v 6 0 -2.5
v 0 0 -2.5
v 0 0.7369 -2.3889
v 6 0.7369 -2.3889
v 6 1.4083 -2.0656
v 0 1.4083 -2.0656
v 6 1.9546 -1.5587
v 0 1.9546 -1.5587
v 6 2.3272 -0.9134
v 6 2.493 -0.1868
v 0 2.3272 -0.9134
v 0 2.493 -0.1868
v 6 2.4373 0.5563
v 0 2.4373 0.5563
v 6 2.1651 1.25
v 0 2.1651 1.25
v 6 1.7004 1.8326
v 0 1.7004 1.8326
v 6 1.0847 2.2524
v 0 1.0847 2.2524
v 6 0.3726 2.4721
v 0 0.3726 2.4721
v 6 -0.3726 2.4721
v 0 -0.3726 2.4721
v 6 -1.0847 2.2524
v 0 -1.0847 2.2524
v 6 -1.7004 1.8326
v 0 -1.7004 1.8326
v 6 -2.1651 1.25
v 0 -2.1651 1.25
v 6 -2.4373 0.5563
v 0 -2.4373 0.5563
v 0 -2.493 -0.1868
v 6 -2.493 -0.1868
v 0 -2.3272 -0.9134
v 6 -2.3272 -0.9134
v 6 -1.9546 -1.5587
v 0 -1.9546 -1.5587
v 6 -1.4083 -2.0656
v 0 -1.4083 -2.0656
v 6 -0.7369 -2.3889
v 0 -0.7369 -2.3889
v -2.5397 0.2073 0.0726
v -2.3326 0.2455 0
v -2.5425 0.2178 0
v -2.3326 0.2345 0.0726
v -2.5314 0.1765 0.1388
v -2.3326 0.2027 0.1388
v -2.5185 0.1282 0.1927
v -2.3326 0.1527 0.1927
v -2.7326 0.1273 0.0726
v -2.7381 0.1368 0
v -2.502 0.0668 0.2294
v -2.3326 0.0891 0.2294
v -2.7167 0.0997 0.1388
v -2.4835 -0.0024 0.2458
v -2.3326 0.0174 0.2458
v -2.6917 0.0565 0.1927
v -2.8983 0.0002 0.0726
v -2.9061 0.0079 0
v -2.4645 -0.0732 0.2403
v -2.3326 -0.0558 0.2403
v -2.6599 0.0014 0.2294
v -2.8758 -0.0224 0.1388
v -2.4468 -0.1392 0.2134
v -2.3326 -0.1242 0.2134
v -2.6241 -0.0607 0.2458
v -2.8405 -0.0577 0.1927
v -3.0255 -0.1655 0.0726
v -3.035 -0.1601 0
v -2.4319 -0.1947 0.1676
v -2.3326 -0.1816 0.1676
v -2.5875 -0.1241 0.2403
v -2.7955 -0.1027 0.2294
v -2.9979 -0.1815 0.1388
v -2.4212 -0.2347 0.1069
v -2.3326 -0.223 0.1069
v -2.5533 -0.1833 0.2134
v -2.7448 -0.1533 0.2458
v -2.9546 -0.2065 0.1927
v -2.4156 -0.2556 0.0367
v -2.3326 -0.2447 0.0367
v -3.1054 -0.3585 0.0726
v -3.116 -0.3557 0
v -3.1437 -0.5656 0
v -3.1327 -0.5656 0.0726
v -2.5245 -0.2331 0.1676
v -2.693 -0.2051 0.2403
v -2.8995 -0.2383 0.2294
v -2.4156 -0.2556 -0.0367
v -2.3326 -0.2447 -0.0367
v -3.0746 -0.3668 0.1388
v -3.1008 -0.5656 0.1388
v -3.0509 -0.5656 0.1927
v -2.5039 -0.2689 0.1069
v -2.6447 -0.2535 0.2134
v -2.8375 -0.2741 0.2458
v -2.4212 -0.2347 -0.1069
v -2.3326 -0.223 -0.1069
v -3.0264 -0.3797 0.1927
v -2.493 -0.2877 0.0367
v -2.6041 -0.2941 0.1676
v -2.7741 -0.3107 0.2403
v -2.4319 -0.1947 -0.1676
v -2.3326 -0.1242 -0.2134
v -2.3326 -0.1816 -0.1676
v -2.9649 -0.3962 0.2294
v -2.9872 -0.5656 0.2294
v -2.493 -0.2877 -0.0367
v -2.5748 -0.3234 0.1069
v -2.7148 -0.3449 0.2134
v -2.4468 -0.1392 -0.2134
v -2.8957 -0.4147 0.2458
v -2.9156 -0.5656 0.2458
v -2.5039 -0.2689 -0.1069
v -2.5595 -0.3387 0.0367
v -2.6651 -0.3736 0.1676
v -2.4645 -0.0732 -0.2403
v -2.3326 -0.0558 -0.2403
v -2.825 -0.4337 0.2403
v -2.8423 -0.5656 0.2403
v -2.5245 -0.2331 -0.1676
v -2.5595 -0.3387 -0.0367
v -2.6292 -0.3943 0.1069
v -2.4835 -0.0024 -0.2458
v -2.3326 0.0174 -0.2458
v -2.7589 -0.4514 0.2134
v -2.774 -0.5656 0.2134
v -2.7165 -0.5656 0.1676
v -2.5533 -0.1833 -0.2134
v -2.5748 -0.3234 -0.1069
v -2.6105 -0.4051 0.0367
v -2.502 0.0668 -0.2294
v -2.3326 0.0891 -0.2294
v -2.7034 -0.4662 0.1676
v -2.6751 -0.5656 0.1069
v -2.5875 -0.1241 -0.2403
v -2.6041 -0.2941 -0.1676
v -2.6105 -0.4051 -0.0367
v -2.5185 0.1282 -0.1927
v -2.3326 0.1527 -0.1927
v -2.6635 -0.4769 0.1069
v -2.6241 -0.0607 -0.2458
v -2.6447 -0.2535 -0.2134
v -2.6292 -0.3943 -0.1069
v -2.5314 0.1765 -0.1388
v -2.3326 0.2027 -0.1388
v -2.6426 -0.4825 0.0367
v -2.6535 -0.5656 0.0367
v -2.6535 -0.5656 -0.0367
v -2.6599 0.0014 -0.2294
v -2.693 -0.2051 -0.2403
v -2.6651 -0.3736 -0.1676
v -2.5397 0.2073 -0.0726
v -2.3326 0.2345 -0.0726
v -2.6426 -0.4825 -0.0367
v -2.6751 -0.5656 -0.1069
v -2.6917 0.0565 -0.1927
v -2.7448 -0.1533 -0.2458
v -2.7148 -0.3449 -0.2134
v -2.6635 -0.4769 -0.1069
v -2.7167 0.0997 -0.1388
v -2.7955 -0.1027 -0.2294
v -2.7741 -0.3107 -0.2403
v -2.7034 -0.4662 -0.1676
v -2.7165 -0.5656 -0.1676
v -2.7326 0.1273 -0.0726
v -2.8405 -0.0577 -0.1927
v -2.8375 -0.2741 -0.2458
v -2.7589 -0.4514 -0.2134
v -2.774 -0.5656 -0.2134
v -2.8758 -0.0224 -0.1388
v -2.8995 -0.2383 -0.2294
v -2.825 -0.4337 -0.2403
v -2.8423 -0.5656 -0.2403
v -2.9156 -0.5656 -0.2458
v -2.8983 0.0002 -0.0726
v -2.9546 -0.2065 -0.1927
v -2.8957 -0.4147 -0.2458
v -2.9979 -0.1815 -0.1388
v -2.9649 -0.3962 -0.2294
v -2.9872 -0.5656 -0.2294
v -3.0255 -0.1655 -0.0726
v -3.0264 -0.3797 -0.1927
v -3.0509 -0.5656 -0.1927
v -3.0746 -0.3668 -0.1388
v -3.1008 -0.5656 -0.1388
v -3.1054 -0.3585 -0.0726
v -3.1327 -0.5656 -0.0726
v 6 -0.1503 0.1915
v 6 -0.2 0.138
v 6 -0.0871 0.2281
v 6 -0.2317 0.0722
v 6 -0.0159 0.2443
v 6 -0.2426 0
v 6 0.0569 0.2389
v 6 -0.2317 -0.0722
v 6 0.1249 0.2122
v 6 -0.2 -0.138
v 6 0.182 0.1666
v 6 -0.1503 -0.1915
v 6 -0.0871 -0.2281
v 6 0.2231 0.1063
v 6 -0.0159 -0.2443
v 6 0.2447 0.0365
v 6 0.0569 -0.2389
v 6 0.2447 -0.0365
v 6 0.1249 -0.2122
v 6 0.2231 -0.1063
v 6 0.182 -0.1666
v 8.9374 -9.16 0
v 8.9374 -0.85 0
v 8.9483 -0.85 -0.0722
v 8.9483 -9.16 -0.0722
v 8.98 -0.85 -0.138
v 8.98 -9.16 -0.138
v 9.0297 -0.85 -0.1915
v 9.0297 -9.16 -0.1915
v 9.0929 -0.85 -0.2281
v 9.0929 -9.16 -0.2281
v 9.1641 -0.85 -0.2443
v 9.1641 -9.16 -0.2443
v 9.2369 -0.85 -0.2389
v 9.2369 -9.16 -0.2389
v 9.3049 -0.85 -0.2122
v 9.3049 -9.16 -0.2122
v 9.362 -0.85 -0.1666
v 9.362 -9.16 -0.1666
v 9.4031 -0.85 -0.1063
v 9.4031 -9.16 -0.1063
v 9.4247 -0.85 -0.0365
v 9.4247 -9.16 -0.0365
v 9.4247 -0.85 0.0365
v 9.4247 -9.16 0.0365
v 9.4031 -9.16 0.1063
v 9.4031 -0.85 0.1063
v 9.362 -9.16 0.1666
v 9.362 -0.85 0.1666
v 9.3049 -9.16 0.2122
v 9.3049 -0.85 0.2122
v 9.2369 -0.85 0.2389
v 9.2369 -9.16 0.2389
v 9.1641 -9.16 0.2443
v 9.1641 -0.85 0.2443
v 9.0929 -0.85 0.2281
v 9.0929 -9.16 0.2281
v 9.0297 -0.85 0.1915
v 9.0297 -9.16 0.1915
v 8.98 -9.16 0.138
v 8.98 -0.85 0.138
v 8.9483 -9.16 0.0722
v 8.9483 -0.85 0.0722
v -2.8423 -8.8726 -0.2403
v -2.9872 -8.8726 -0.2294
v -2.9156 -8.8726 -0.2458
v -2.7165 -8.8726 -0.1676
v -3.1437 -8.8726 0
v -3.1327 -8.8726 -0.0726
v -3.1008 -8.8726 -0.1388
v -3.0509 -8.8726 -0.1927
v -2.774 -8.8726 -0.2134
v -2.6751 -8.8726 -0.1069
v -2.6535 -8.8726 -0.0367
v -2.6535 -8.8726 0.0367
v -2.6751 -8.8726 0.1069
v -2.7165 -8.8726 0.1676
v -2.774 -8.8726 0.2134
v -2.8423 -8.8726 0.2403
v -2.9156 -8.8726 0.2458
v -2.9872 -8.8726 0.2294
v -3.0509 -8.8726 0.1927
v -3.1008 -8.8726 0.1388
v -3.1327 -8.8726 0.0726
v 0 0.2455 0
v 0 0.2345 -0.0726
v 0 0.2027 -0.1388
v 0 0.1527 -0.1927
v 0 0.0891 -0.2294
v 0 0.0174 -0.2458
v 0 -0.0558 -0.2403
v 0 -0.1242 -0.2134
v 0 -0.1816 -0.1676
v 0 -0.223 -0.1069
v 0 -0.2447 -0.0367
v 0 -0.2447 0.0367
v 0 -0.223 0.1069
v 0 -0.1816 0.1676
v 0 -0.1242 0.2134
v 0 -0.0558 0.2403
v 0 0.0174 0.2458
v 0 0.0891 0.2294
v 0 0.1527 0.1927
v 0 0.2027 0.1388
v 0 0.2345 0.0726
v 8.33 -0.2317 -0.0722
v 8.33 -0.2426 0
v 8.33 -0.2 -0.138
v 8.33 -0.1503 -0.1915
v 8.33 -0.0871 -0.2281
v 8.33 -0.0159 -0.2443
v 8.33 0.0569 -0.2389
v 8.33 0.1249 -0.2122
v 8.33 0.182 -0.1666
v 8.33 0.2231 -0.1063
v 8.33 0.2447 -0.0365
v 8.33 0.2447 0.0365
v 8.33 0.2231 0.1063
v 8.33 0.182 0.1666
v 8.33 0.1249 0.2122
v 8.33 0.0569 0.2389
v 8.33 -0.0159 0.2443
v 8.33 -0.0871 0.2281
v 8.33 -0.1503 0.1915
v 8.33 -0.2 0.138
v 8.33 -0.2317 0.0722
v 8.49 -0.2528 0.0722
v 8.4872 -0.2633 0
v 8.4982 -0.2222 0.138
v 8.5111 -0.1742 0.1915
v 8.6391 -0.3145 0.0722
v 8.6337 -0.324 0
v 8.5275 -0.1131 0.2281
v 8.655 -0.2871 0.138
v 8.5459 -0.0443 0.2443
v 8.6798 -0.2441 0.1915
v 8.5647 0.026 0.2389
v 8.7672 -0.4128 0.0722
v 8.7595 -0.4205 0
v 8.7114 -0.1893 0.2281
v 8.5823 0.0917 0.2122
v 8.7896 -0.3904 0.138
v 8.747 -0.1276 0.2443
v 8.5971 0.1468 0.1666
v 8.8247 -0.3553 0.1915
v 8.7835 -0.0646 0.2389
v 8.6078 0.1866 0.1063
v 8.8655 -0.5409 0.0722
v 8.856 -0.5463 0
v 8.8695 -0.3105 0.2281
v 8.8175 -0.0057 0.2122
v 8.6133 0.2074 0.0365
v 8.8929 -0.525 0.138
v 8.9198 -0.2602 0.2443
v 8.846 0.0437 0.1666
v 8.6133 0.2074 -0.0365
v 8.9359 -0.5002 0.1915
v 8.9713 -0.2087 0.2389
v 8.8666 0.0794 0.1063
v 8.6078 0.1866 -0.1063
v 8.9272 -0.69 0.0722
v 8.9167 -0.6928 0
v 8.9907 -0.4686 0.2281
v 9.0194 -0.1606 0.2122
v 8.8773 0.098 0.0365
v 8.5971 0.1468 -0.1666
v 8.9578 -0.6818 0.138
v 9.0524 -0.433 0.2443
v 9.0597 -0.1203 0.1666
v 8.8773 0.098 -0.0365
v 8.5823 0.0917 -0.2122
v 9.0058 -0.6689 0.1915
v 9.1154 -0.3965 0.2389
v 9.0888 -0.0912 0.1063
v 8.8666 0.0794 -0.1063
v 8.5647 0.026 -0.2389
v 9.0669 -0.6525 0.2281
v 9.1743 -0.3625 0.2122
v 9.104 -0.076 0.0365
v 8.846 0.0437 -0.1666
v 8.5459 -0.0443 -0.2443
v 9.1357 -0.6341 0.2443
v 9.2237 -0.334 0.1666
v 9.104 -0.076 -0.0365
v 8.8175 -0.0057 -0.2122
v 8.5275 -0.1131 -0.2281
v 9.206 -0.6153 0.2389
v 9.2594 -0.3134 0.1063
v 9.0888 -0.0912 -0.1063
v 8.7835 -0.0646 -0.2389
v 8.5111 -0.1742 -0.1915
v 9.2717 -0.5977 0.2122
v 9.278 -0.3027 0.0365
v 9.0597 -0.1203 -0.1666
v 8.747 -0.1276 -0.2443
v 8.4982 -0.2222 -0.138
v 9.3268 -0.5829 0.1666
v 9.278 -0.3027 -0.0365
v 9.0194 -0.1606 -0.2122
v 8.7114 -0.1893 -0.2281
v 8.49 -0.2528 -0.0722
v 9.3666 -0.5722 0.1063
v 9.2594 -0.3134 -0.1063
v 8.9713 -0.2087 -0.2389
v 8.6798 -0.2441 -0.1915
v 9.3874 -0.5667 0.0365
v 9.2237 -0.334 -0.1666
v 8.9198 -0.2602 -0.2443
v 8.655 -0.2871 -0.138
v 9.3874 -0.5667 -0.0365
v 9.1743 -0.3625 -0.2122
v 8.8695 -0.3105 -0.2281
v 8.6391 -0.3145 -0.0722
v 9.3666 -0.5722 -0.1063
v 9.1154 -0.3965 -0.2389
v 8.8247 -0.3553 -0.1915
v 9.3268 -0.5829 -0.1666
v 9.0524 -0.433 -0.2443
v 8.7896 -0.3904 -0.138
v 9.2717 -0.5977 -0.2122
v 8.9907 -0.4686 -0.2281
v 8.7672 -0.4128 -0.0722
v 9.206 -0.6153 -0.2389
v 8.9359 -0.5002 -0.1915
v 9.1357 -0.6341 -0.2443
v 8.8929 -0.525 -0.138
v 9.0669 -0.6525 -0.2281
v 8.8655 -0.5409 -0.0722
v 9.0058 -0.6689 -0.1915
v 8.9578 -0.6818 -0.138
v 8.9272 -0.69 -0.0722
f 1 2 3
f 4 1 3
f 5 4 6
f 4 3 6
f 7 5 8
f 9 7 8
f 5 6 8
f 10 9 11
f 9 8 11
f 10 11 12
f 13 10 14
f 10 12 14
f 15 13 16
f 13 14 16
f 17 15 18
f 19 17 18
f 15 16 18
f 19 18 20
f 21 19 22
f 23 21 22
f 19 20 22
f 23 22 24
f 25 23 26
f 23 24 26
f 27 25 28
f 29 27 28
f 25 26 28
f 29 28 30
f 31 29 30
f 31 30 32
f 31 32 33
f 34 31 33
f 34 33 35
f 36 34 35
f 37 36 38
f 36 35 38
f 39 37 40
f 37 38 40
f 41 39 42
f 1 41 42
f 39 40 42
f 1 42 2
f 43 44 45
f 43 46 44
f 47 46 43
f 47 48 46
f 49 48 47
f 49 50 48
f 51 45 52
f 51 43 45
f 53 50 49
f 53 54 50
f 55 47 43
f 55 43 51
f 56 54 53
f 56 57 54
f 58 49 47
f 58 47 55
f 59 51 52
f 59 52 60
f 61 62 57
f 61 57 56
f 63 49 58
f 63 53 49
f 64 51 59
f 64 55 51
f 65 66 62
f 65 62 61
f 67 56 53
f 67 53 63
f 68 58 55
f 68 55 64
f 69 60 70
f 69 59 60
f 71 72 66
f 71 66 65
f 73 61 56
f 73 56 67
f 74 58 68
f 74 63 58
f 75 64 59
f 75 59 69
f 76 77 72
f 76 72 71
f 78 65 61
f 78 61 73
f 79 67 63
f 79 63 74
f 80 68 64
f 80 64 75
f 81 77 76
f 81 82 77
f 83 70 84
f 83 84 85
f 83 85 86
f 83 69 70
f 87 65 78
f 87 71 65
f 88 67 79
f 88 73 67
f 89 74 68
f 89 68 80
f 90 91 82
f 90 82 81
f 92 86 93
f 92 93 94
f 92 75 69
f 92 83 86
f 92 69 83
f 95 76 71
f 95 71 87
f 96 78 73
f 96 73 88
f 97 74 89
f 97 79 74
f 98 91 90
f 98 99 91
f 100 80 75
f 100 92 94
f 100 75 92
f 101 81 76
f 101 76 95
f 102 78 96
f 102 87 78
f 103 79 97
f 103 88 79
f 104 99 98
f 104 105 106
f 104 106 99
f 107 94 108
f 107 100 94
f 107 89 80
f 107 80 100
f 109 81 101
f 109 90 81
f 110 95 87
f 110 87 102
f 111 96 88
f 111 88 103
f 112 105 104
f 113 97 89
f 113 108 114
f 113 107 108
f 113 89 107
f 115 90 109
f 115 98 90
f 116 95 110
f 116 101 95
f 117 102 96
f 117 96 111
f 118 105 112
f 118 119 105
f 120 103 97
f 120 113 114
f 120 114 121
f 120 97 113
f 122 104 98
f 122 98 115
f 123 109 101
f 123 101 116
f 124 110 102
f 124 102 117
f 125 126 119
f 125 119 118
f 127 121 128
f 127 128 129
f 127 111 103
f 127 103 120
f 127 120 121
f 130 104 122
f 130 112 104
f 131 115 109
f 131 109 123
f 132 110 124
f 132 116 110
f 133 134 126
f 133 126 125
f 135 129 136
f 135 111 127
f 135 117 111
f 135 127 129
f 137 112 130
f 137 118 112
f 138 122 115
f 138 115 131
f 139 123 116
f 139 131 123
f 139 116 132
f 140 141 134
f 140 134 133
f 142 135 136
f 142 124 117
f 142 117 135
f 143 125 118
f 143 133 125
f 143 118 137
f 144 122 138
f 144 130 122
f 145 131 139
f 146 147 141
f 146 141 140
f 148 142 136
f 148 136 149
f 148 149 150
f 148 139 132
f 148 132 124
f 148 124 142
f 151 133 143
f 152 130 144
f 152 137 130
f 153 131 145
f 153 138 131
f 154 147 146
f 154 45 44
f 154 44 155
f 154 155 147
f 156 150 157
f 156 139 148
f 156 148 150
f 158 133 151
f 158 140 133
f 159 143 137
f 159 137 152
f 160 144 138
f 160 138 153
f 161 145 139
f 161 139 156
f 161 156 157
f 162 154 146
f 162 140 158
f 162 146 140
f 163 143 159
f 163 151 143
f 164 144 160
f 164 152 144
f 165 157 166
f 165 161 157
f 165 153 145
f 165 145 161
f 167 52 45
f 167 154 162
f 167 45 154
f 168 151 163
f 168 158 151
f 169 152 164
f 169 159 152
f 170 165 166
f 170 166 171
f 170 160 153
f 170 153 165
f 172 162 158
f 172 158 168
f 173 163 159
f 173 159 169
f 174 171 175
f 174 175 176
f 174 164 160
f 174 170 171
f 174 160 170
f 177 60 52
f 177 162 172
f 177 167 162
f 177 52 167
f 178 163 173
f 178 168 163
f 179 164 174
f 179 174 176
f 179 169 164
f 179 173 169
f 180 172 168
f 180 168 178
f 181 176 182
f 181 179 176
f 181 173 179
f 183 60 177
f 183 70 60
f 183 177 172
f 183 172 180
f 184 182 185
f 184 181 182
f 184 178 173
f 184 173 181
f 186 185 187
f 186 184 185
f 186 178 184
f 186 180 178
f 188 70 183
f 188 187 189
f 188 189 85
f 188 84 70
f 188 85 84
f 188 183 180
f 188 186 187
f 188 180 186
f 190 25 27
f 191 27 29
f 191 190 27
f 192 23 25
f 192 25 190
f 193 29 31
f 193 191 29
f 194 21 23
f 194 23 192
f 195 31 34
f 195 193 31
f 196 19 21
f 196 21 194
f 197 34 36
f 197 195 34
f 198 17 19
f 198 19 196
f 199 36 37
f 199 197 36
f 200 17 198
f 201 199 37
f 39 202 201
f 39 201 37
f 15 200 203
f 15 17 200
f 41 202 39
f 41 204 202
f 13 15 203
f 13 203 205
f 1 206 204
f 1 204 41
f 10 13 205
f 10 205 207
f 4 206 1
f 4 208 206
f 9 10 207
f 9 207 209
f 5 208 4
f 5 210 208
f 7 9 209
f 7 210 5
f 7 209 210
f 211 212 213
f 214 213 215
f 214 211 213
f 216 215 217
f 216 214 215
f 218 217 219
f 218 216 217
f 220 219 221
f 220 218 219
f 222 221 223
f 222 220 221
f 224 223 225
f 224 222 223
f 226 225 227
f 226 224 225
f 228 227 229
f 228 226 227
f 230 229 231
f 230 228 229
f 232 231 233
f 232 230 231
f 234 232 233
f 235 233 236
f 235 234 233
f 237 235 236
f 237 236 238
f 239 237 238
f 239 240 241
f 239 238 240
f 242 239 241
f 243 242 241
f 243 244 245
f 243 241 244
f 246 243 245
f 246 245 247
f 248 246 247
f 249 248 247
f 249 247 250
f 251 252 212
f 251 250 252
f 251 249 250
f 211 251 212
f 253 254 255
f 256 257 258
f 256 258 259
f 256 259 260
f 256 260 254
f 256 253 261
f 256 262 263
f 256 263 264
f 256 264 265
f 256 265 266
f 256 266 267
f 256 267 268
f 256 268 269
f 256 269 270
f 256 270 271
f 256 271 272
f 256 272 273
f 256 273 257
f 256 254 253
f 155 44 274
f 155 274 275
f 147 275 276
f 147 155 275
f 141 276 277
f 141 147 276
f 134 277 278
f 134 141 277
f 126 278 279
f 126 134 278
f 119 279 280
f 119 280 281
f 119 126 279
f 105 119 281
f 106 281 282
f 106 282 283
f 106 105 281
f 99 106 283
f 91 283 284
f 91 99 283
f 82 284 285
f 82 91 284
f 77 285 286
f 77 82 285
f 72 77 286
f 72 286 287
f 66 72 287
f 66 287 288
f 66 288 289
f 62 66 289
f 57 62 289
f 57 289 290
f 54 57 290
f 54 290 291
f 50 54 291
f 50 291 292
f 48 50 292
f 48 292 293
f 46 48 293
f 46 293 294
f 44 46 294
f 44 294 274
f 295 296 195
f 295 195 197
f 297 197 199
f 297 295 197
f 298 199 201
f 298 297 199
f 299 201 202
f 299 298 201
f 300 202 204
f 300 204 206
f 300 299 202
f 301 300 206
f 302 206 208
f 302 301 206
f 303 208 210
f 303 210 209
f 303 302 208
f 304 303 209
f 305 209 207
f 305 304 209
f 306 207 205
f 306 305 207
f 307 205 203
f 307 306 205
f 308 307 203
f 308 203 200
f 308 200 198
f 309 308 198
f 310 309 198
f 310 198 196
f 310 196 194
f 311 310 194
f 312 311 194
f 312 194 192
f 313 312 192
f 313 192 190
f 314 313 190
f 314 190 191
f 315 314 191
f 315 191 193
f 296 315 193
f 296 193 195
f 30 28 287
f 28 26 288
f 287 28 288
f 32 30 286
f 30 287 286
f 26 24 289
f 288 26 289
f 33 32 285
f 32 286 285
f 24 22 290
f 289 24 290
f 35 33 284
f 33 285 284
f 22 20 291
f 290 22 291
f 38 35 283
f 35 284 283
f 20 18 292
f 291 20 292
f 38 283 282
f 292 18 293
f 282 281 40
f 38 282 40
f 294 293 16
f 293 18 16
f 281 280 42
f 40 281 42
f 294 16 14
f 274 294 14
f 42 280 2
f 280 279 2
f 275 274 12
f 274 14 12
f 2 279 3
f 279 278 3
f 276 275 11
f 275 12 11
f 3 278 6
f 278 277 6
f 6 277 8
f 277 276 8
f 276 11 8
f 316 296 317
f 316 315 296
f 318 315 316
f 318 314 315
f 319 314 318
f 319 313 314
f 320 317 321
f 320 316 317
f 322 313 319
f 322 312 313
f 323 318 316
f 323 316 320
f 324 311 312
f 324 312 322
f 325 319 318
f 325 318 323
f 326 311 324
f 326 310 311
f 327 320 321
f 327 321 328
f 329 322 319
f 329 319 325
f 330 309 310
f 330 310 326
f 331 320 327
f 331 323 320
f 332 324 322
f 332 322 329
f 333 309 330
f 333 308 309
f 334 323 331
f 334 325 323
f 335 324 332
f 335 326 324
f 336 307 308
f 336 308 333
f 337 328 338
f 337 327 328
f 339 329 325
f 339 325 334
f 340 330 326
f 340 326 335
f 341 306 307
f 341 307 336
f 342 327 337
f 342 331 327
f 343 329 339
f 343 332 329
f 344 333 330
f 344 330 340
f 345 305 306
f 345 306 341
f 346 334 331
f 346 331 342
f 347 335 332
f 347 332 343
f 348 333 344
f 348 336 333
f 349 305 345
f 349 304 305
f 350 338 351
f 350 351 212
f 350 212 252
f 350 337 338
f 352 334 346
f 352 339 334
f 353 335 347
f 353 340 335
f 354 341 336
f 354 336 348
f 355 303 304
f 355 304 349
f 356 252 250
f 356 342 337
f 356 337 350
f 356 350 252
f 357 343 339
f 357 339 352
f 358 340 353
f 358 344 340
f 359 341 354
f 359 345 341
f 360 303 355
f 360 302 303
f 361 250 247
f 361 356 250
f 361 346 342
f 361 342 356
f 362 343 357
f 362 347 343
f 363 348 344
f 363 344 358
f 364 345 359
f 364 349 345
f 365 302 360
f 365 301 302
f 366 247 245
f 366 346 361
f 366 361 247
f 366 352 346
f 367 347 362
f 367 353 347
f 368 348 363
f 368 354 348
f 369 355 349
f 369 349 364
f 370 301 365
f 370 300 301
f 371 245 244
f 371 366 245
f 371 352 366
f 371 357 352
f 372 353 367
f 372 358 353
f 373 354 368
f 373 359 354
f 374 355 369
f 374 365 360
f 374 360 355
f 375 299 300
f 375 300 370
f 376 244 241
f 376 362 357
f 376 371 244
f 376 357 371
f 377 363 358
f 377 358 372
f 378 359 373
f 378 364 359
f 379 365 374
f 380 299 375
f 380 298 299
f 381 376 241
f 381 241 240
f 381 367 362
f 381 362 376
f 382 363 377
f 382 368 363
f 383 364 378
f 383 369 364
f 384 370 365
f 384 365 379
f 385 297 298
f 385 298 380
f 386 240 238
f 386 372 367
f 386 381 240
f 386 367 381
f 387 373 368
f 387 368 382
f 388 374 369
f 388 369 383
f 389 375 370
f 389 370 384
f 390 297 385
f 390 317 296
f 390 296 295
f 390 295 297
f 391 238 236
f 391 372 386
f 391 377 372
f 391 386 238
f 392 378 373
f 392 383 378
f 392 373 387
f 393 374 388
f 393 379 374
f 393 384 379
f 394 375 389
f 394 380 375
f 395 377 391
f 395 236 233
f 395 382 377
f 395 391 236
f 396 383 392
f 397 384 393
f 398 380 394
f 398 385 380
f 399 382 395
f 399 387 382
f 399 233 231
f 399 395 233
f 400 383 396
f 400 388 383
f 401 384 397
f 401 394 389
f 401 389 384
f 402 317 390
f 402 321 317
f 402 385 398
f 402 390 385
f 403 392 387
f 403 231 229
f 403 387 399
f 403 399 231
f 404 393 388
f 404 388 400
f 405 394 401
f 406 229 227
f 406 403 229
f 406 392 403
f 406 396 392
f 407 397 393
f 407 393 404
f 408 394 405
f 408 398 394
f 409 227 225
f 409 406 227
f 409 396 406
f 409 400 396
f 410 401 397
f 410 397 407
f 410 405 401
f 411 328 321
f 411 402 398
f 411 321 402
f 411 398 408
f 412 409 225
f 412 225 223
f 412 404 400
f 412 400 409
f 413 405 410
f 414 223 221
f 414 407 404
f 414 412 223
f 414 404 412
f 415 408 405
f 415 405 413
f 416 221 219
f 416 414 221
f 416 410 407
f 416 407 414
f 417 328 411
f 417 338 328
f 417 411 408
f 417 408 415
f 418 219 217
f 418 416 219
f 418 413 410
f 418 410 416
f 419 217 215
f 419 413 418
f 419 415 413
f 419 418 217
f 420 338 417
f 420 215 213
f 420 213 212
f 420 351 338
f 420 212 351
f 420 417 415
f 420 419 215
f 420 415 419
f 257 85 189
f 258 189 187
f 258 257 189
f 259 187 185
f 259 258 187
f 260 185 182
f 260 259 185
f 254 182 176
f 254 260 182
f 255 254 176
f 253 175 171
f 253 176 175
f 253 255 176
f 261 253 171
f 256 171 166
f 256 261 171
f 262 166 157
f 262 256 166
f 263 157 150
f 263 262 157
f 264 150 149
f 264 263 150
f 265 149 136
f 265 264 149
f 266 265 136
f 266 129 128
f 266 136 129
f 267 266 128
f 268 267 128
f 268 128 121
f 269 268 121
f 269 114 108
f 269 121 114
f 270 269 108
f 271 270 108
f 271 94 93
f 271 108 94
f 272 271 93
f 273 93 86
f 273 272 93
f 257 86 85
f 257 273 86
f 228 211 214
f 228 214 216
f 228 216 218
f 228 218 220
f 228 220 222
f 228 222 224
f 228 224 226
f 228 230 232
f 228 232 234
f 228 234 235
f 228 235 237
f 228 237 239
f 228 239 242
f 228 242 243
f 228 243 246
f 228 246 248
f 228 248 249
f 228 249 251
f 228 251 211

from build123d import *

# Parameters (mm, degrees)
IZIM1_R                     = 2.5
Y_KSEKLIK_EKSTR_ZYON1_DEPTH = 6
IZIM5_R                     = 0.246458924
IZIM7_R                     = 0.245


with BuildPart() as part:
    # Çizim1 → Yükseklik-Ekstrüzyon1 (new body)
    with BuildSketch(Plane(origin=(0, 0, 0), x_dir=(0, 0, -1), z_dir=(1, 0, 0))):
        Circle(IZIM1_R)
    extrude(amount=Y_KSEKLIK_EKSTR_ZYON1_DEPTH)

    # Süpür1: sweep along a path in Çizim4
    with BuildLine(Plane.XY) as s_p_r1_path:
        Line((0, 0), (-2.33257059, 0))
        ThreePointArc((-2.33257059, 0), (-2.732509931, -0.165660299), (-2.89817023, -0.56559964))
        Line((-2.89817023, -0.56559964), (-2.89817023, -8.872558098))
    # Çizim5 → Süpür1 (sweep)
    with BuildSketch(Plane(origin=(-2.89817023, -8.872558098, 0), x_dir=(-1, 0, 0), z_dir=(0, -1, 0))):
        with Locations((-0.000978554, 0)):
            Circle(IZIM5_R)
    sweep(path=s_p_r1_path.line)

    # Süpür2: sweep along a path in Çizim6
    with BuildLine(Plane.XY) as s_p_r2_path:
        Line((6, 0), (8.33, 0))
        ThreePointArc((8.33, 0), (8.931040764, -0.248959236), (9.18, -0.85))
        Line((9.18, -0.85), (9.18, -9.16))
    # Çizim7 → Süpür2 (sweep)
    with BuildSketch(Plane(origin=(9.18, -9.16, 0), x_dir=(-1, 0, 0), z_dir=(0, -1, 0))):
        with Locations((-0.002407495, 0)):
            Circle(IZIM7_R)
    sweep(path=s_p_r2_path.line)


solid = part.part
